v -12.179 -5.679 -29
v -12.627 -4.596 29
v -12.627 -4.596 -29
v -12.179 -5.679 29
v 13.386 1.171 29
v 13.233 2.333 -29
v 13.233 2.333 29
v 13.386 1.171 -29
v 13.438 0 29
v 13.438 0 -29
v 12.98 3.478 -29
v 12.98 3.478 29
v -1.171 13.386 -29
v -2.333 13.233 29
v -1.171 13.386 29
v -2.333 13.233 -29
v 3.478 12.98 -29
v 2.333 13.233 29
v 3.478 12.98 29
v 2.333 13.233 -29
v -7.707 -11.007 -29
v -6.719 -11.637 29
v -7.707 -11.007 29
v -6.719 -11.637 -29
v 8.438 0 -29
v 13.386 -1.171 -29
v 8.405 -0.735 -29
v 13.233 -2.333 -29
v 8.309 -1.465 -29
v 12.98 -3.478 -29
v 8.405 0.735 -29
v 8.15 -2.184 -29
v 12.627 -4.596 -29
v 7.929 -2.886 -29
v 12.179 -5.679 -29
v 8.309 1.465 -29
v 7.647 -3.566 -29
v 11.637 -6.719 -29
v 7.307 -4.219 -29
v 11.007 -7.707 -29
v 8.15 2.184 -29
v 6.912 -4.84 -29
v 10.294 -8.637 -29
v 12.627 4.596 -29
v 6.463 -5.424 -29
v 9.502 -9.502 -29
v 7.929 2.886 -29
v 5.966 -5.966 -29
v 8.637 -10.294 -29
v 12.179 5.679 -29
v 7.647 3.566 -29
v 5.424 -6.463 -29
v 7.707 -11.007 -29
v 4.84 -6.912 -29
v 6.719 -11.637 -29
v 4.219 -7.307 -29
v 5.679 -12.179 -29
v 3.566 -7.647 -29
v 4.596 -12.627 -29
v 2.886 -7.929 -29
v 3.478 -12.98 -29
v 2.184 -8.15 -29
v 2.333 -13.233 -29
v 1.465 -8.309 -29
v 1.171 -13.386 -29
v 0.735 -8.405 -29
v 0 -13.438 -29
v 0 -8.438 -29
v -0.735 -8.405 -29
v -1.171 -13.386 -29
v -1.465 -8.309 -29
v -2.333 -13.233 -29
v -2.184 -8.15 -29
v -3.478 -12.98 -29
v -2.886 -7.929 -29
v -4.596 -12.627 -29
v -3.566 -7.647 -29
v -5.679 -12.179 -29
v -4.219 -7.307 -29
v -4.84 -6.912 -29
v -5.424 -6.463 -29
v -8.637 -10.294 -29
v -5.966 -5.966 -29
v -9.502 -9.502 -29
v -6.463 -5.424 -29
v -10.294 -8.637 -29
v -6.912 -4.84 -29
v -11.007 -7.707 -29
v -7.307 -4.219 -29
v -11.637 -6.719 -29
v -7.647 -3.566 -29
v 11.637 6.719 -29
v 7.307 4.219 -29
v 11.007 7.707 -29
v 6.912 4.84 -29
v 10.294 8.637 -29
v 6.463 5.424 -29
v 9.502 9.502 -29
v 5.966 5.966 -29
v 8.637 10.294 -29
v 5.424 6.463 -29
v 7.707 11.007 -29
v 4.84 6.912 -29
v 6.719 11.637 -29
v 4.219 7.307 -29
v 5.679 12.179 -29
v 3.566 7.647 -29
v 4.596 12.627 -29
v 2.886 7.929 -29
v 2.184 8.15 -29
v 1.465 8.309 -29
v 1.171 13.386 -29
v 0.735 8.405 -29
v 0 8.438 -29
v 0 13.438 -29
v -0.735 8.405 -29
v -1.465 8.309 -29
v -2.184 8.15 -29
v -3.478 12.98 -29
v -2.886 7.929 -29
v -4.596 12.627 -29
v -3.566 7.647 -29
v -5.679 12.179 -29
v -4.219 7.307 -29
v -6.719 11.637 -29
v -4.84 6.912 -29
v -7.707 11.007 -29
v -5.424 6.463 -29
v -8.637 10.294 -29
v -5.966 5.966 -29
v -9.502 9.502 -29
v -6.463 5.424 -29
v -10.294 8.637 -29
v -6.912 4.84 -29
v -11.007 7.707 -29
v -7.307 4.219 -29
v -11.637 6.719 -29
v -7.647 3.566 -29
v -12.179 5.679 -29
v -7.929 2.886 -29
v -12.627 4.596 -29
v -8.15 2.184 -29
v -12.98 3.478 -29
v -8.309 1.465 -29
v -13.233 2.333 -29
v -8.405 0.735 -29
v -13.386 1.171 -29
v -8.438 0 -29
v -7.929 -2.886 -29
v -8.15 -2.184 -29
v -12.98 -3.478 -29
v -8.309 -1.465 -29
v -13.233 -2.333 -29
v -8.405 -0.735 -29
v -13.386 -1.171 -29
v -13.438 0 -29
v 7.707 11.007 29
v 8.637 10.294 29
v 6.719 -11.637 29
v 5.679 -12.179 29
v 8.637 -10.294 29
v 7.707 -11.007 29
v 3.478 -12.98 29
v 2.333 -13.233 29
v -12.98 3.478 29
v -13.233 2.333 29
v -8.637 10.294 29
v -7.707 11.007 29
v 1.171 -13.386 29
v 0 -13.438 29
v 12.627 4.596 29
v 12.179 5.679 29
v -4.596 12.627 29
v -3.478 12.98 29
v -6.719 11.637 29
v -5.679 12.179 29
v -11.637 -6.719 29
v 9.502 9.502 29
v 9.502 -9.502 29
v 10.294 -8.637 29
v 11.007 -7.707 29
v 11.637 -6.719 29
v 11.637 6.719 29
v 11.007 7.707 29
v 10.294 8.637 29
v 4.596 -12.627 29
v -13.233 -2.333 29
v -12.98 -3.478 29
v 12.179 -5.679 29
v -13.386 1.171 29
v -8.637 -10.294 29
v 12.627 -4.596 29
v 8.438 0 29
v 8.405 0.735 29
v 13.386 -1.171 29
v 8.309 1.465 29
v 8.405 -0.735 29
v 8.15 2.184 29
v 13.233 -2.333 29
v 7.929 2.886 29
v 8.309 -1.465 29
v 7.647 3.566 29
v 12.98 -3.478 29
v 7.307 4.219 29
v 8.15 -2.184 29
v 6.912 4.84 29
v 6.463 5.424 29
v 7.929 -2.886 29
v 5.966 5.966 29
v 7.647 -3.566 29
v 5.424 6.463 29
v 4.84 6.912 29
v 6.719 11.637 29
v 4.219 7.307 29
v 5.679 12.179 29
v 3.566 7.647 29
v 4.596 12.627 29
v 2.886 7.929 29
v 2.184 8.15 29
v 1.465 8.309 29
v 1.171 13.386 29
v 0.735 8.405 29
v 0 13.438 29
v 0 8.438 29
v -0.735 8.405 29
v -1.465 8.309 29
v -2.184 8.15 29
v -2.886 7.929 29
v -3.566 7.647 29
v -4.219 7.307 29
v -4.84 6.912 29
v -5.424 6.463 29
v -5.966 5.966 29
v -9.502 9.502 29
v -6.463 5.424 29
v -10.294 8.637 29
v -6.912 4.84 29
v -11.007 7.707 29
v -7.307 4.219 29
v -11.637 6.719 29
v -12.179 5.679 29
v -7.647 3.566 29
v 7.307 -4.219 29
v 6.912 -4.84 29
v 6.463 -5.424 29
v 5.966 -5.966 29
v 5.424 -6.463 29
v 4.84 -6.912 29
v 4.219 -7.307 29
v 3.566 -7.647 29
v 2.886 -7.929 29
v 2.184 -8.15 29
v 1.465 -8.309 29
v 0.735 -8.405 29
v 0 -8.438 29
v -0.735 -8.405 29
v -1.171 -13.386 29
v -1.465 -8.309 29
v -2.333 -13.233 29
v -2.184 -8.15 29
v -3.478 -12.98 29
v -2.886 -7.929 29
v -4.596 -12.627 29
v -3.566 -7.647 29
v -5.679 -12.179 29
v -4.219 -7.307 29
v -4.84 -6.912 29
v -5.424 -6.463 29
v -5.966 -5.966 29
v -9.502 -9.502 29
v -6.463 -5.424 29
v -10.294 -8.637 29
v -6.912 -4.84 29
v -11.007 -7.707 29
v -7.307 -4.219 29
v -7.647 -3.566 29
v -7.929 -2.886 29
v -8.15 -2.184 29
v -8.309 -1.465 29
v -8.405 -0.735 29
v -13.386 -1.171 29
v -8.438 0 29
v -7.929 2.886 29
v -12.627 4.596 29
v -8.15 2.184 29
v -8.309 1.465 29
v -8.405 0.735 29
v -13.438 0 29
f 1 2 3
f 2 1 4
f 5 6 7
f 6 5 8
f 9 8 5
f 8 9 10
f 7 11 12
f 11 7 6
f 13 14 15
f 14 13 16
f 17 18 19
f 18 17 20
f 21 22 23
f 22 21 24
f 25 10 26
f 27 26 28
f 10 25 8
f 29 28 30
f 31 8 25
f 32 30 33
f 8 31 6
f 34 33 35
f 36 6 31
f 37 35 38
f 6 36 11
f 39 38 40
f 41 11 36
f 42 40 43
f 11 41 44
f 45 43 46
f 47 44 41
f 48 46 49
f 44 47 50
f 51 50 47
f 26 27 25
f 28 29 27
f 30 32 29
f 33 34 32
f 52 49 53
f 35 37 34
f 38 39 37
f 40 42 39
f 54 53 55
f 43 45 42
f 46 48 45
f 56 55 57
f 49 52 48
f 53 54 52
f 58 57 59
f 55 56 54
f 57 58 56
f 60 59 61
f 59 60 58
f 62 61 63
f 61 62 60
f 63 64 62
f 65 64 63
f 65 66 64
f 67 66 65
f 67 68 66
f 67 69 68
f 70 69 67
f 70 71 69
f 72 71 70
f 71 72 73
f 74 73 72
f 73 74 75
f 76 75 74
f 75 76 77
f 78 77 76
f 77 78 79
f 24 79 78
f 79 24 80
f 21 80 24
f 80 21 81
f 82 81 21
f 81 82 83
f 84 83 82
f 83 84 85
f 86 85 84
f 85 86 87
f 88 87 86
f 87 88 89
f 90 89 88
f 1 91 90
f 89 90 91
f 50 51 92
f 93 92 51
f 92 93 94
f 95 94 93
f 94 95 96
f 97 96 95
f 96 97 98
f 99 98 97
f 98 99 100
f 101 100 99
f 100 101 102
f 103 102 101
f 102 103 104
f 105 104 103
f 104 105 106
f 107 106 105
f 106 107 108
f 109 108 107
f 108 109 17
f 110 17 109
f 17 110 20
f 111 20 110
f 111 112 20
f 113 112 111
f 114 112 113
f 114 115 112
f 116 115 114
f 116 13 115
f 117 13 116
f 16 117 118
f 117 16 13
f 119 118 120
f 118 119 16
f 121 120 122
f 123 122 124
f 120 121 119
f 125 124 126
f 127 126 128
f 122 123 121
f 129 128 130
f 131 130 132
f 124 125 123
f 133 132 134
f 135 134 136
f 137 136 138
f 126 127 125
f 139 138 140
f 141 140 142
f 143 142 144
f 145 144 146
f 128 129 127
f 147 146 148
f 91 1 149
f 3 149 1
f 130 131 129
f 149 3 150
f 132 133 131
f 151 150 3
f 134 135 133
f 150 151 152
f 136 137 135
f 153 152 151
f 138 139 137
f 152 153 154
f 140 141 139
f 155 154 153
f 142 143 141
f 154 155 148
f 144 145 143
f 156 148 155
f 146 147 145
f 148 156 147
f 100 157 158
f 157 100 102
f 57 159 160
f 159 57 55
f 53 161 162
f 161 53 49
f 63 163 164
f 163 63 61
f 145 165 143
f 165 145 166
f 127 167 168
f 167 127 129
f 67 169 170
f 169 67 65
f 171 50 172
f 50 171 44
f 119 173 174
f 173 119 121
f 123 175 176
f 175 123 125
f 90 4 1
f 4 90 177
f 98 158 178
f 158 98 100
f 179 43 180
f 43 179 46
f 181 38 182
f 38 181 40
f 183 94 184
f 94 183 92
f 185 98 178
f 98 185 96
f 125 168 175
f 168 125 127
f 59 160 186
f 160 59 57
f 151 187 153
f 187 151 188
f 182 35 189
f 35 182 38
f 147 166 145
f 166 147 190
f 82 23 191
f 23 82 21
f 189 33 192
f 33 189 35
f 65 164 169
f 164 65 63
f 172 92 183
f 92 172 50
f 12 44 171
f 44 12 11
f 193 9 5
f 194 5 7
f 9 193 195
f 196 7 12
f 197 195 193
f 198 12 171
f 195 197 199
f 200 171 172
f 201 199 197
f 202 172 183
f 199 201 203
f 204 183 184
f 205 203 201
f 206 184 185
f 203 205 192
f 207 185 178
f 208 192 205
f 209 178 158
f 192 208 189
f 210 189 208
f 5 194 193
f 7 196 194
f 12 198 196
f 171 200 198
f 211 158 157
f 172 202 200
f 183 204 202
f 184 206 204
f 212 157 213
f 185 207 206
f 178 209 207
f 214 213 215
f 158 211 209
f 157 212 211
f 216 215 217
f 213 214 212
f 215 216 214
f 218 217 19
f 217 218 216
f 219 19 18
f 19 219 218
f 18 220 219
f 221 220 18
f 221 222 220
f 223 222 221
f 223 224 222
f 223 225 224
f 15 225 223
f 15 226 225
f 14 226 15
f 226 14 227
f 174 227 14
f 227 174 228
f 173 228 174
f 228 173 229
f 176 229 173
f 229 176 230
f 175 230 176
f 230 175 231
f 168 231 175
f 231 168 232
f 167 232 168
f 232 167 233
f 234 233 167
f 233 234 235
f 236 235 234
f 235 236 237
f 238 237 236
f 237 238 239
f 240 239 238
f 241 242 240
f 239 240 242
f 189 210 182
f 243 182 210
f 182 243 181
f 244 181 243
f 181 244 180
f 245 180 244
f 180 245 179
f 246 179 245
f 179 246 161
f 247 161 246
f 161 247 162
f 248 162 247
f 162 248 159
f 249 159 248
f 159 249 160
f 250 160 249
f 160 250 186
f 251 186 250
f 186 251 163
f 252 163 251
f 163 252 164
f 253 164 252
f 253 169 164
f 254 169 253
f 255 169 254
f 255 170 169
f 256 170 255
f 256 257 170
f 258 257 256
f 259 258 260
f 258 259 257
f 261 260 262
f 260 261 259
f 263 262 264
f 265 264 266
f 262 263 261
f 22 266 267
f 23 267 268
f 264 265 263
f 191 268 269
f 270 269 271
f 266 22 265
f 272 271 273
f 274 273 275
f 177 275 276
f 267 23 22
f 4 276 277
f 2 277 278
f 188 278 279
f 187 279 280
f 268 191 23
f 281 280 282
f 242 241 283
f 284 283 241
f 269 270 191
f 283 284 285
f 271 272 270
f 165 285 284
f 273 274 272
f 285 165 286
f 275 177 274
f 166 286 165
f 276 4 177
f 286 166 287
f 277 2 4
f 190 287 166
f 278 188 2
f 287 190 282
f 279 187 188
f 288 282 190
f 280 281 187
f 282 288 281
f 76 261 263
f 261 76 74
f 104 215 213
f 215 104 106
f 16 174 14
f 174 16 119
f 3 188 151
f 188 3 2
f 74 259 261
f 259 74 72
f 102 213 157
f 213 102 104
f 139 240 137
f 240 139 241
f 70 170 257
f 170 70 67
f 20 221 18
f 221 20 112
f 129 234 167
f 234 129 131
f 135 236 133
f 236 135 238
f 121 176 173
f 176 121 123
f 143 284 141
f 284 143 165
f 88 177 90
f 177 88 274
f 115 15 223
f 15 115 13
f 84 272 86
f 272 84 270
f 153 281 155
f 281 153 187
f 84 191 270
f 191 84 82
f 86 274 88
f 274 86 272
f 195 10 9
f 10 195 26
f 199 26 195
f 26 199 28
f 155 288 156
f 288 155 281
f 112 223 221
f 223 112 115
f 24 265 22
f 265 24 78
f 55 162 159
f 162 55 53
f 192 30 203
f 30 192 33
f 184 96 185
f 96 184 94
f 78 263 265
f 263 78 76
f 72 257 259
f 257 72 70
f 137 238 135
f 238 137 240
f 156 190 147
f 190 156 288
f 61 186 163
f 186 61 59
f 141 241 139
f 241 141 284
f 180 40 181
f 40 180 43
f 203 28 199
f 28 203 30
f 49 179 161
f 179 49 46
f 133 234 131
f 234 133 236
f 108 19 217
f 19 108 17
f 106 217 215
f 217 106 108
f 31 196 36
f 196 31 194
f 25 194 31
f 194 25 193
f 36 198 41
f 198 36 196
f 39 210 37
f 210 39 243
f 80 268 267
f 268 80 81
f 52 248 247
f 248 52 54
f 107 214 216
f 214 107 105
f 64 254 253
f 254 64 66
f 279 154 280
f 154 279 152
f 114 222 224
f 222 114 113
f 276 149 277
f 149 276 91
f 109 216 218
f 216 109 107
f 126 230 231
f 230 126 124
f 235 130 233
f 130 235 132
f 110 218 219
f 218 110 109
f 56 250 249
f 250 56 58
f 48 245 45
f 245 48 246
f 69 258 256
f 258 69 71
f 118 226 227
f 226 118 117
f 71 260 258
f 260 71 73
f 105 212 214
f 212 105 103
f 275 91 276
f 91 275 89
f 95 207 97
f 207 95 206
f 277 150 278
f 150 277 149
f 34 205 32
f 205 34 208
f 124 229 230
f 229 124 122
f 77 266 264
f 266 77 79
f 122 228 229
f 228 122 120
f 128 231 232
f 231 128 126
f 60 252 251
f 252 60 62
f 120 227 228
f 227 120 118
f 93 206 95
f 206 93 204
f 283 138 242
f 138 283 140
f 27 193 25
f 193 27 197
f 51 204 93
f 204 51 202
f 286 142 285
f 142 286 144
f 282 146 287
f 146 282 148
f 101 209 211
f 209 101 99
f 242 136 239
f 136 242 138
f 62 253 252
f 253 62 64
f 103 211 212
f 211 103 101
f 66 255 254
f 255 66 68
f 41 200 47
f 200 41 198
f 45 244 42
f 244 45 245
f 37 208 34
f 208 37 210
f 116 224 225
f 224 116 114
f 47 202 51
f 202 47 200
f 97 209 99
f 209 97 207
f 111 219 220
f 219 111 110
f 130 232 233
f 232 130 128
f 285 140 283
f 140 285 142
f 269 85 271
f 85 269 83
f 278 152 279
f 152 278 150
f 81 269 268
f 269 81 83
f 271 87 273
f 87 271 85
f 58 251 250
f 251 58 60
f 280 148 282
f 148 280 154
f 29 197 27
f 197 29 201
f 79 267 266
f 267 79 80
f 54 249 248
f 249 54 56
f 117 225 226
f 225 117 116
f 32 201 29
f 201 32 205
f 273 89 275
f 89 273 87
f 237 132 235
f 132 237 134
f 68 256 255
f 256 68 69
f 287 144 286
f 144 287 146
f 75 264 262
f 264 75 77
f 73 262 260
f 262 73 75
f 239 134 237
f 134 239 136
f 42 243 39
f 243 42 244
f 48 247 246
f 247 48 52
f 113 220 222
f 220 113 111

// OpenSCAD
$fn=72;
axleSpacer2();
//pulleyBorder();

module axleSpacer(height=36, holeWidth=(5/16*25.4+1), width=(5/16*25.4+1)+10)
{
    difference()
    {
        cylinder(d=width, h=height, center=true);
        cylinder(d=holeWidth, h=height, center=true);
    }
}

module axleSpacer2(height=58, holeWidth=(5/8*25.4+1), width=(5/8*25.4+1)+10)
{
    difference()
    {
        cylinder(d=width, h=height, center=true);
        cylinder(d=holeWidth, h=height, center=true);
    }
}

module pulleyBorder(startDiam=152, endDiam=162, height=5)
{
    difference()
    {
        union()
        {
            difference()
            {
                cylinder(d1=endDiam, d2=startDiam, h=height, center=true);
                
                cylinder(d=135, h=height, center=true);
            }
            
            cube([135, 10, height], center=true);
            cube([10, 135, height], center=true);
            
            for (zAngle = [0:90:360])
            {
                rotate([0, 0, zAngle])
                translate([(2.75*25.4)/2, 0, 0])
                cylinder(d=18, h=height, center=true);
            }
            
            cylinder(d=35, h=height, center=true);
        }
        
        union()
        {
            for (zAngle = [0:90:360])
            {
                rotate([0, 0, zAngle])
                translate([(2.75*25.4)/2, 0, 0])
                cylinder(d=(5/16*25.4+1), h=40, center=true);
            }
            
            cylinder(d=25, h=height, center=true);
            
            rotate([0, 0, 45])
            translate([250, 0, 0])
            cube([500, 500, 100], center=true);
        }
    }
}
